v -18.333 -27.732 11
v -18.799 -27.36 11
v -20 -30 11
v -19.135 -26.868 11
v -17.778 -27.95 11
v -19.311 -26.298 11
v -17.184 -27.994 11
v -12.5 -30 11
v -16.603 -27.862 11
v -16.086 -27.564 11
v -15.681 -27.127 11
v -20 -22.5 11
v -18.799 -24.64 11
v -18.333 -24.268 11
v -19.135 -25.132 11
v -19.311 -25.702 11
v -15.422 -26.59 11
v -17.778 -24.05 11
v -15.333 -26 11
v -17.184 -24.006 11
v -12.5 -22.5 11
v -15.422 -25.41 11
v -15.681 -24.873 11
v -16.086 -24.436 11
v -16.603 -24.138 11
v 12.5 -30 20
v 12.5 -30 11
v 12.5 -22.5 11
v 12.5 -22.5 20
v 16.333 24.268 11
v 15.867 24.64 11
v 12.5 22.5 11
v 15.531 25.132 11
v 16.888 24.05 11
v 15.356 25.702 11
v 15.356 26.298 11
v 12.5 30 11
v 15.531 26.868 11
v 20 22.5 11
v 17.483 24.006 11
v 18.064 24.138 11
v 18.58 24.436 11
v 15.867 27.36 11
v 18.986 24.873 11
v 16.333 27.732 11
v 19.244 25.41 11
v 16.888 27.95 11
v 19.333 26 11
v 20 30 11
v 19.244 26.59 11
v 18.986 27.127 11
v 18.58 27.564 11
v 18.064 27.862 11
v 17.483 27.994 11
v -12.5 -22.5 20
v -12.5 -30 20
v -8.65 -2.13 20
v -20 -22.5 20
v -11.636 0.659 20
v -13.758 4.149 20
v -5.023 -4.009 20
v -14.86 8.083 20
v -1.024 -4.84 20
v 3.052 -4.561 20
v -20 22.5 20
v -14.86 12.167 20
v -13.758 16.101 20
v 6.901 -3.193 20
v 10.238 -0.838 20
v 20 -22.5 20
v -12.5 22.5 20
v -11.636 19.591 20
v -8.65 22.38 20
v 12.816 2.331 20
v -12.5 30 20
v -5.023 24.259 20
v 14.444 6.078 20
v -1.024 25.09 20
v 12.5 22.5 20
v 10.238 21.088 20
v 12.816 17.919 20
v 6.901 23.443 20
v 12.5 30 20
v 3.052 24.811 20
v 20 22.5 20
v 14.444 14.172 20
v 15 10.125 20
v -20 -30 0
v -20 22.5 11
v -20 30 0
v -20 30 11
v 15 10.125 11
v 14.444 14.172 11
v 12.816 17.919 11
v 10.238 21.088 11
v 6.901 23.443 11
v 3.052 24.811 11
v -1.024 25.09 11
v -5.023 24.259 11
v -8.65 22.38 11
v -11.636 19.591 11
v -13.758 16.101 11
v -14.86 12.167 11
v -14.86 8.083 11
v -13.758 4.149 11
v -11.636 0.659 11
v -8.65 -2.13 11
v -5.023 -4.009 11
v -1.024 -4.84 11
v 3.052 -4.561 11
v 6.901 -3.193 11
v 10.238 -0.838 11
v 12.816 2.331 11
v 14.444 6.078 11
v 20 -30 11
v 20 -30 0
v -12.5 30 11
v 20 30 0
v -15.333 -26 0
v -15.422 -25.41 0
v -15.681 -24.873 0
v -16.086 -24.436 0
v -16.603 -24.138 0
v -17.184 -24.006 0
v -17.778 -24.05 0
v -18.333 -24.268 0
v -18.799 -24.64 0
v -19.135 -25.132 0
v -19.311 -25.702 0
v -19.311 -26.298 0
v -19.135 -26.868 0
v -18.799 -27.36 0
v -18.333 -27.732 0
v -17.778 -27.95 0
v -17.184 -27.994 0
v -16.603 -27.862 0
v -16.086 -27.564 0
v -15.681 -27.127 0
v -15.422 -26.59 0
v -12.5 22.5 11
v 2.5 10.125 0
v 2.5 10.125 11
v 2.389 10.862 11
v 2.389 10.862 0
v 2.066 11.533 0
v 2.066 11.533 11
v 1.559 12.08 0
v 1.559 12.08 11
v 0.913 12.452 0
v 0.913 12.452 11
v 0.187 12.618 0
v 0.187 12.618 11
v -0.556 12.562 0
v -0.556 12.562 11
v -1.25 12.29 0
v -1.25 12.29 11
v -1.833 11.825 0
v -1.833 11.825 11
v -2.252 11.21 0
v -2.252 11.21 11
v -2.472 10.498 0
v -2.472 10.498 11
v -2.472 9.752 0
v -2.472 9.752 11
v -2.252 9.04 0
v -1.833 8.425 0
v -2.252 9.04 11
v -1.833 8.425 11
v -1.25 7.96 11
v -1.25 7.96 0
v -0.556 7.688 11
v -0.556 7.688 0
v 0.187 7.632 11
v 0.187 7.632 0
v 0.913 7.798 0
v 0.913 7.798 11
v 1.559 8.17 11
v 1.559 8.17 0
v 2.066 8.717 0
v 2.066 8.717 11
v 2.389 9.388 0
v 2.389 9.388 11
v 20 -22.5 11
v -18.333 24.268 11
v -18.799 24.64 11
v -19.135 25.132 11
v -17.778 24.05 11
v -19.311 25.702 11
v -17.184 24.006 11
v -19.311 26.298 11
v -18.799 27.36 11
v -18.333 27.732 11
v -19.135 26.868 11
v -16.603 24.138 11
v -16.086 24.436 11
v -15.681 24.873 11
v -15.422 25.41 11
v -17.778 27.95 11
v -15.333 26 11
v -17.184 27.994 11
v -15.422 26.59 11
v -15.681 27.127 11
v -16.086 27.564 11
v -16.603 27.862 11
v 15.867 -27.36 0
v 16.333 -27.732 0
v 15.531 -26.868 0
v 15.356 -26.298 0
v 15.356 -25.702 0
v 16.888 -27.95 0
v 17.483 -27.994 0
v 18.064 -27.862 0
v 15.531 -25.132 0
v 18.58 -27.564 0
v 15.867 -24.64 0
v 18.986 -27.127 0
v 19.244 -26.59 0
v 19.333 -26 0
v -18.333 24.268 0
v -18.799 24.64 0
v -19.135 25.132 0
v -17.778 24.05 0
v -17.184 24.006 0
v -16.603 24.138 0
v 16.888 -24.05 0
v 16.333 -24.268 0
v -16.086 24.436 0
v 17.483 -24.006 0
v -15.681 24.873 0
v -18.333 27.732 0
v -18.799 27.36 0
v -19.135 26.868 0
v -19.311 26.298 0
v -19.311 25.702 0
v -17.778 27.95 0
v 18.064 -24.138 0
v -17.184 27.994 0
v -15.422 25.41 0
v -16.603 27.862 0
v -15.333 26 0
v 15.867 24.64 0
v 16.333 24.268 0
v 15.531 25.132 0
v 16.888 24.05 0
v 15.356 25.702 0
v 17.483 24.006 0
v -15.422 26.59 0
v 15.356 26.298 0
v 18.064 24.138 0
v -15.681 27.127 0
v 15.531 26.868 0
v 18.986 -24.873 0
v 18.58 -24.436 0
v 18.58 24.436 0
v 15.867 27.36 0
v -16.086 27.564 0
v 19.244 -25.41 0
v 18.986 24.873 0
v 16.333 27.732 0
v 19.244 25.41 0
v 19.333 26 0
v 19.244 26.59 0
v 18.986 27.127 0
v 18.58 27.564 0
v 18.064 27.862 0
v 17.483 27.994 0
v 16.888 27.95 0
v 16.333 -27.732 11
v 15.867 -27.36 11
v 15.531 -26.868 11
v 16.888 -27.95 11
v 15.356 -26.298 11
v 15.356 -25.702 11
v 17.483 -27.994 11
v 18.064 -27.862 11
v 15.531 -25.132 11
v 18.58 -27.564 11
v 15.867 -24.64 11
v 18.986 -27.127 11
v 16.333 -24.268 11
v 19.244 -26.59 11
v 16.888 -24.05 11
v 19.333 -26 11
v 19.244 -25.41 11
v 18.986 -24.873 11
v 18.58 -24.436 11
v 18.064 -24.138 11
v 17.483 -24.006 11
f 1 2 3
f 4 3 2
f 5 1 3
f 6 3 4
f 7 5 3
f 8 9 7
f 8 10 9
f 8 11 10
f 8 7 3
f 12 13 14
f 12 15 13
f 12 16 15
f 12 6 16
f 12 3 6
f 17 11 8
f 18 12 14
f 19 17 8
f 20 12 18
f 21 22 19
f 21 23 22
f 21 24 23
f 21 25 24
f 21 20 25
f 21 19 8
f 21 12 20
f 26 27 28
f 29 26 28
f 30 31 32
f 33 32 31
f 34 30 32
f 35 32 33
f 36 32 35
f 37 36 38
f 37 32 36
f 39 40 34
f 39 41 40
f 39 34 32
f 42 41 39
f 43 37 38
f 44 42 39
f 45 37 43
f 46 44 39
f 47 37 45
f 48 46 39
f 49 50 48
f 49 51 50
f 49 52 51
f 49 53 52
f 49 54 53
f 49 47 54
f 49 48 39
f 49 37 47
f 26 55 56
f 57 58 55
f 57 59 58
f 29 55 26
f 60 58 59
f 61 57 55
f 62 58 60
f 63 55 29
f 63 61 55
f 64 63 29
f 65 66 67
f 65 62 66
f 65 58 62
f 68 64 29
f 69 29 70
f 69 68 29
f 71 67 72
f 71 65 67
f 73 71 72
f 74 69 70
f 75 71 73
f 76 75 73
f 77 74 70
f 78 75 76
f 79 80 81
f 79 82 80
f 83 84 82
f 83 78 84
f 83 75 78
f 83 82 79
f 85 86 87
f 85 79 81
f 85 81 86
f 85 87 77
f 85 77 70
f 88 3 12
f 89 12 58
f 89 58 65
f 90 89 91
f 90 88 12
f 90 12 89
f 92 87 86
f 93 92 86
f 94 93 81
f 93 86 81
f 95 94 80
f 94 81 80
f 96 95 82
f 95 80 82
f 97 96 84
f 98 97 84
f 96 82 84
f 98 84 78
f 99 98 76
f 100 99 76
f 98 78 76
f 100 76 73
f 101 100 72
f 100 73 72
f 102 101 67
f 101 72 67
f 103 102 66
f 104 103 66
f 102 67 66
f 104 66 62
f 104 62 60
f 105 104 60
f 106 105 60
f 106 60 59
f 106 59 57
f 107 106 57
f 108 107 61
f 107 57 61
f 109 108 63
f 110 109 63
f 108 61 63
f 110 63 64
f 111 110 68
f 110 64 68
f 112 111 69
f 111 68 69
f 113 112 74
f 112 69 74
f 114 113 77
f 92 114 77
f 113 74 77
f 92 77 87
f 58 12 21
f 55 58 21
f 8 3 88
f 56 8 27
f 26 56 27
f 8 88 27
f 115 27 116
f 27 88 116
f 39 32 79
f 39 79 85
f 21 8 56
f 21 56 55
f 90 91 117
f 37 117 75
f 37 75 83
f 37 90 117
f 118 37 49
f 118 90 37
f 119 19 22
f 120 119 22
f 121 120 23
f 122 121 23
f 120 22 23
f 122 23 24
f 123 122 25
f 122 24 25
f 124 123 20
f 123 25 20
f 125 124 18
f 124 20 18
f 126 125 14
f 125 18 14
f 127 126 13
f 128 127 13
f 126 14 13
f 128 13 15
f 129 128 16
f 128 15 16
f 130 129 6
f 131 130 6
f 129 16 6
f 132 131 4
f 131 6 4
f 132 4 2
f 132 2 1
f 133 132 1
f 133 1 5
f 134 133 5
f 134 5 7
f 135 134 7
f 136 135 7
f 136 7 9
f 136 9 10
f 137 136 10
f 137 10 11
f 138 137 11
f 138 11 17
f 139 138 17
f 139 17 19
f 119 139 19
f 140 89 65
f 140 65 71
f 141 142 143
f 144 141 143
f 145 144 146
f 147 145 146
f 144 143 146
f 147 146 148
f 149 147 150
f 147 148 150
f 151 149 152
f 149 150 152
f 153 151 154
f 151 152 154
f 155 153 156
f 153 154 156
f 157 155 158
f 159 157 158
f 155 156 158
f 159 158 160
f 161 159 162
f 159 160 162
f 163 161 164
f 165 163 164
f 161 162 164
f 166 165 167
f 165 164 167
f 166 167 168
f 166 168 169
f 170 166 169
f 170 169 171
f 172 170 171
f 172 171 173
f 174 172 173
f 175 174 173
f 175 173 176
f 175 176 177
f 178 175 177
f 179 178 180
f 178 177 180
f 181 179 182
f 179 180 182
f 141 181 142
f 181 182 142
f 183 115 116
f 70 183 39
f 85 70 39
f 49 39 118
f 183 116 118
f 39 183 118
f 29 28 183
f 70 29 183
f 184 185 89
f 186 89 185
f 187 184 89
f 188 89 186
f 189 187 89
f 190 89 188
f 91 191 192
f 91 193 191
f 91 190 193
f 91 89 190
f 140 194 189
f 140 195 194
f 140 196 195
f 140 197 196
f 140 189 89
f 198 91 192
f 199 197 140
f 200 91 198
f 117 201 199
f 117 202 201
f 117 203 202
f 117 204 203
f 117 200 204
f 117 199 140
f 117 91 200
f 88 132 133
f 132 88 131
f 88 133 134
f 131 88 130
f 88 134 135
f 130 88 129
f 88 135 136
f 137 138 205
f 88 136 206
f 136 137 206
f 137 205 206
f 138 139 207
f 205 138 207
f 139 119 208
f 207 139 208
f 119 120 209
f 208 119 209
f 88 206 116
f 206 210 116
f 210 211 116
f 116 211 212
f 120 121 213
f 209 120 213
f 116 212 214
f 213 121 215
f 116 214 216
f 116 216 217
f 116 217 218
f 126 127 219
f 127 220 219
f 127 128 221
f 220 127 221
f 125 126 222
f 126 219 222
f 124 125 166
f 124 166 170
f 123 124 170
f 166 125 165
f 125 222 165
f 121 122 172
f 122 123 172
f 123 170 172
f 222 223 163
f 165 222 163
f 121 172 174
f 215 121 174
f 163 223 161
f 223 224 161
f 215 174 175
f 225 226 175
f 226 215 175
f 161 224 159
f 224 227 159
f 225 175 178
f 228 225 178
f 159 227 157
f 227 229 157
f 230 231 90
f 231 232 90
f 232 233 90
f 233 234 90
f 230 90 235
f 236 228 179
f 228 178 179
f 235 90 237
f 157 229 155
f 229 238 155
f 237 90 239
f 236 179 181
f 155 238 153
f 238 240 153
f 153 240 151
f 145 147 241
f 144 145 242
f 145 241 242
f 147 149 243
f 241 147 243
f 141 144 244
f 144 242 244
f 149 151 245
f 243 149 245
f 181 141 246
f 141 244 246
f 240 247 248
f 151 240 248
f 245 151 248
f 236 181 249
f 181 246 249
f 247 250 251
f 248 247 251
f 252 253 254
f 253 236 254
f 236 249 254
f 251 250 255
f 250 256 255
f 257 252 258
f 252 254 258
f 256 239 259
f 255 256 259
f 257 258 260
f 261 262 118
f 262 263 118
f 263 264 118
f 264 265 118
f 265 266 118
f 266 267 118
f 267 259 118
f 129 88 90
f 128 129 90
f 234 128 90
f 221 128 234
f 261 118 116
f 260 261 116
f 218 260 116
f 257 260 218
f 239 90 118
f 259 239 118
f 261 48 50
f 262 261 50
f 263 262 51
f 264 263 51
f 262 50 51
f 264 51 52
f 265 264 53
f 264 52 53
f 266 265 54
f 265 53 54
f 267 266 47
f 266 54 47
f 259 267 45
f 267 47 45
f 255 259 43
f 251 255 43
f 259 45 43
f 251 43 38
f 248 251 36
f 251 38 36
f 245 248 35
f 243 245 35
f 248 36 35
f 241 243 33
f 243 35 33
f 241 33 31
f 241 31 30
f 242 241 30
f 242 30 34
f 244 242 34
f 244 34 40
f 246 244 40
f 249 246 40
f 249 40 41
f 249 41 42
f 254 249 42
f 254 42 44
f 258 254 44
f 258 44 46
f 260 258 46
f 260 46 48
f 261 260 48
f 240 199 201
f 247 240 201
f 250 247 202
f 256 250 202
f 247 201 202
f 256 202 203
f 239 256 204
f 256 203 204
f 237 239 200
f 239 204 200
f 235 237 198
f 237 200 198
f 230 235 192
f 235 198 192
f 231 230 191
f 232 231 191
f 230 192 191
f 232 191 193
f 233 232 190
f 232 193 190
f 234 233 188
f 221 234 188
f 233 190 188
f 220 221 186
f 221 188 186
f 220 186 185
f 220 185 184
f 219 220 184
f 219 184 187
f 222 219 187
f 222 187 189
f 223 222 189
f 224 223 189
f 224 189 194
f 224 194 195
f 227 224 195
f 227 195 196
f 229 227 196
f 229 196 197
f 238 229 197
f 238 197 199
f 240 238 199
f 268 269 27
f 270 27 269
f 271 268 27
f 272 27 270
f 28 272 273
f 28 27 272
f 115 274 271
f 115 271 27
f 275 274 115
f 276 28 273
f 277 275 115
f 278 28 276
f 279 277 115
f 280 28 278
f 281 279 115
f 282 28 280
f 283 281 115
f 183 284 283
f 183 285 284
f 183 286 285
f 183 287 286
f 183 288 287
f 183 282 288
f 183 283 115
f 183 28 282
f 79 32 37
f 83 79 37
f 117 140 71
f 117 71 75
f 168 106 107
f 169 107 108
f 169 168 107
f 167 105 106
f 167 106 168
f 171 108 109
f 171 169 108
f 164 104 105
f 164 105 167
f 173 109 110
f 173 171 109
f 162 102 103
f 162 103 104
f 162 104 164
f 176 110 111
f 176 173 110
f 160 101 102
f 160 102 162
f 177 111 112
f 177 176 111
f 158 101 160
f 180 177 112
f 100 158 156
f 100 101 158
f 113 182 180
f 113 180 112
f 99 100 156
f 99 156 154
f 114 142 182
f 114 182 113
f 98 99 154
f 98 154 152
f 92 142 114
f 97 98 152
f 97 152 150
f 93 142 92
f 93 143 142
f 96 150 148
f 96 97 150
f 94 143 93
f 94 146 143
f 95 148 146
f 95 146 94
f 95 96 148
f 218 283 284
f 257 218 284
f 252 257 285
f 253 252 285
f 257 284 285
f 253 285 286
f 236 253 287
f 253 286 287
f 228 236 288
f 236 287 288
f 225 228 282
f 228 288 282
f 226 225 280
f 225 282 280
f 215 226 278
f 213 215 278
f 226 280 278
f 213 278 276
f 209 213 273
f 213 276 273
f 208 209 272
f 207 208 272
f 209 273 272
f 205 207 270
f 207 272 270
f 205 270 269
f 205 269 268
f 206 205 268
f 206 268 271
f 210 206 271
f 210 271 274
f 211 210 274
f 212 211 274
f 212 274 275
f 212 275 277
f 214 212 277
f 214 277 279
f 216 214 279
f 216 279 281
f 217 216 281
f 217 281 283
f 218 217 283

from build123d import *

# Parameters (mm, degrees)
SKETCH1_W           = 40
SKETCH1_H           = 60
BOSS_EXTRUDE1_DEPTH = 20
SKETCH2_R           = 15
CUT_EXTRUDE1_DEPTH  = 9
SKETCH3_R           = 2
CUT_EXTRUDE2_DEPTH  = 32
SKETCH4_W           = 15
SKETCH4_H           = 15
CUT_EXTRUDE3_DEPTH  = 9
SKETCH5_R           = 2.5
CUT_EXTRUDE4_DEPTH  = 11


with BuildPart() as part:
    # Sketch1 → Boss-Extrude1 (new body)
    with BuildSketch(Plane.XY):
        Rectangle(SKETCH1_W, SKETCH1_H)
    extrude(amount=BOSS_EXTRUDE1_DEPTH)

    # Sketch2 → Cut-Extrude1 (cut)
    with BuildSketch(Plane.XY.offset(20)):
        with Locations((0, 10.125)):
            Circle(SKETCH2_R)
    extrude(amount=-CUT_EXTRUDE1_DEPTH, mode=Mode.SUBTRACT)

    # Sketch3 → Cut-Extrude2 (cut)
    with BuildSketch(Plane.XY.offset(11)):
        with Locations((17.333333333, 26)):
            Circle(SKETCH3_R)
        with Locations((-17.333333333, 26)):
            Circle(SKETCH3_R)
        with Locations((17.333333333, -26)):
            Circle(SKETCH3_R)
        with Locations((-17.333333333, -26)):
            Circle(SKETCH3_R)
    extrude(amount=-CUT_EXTRUDE2_DEPTH, mode=Mode.SUBTRACT)

    # Sketch4 → Cut-Extrude3 (cut)
    with BuildSketch(Plane.XY.offset(20)):
        with Locations((-20, 30)):
            Rectangle(SKETCH4_W, SKETCH4_H)
        with Locations((20, 30)):
            Rectangle(SKETCH4_W, SKETCH4_H)
        with Locations((-20, -30)):
            Rectangle(SKETCH4_W, SKETCH4_H)
        with Locations((20, -30)):
            Rectangle(SKETCH4_W, SKETCH4_H)
    extrude(amount=-CUT_EXTRUDE3_DEPTH, mode=Mode.SUBTRACT)

    # Sketch5 → Cut-Extrude4 (cut)
    with BuildSketch(Plane.XY.offset(11)):
        with Locations((0, 10.125)):
            Circle(SKETCH5_R)
    extrude(amount=-CUT_EXTRUDE4_DEPTH, mode=Mode.SUBTRACT)


solid = part.part
